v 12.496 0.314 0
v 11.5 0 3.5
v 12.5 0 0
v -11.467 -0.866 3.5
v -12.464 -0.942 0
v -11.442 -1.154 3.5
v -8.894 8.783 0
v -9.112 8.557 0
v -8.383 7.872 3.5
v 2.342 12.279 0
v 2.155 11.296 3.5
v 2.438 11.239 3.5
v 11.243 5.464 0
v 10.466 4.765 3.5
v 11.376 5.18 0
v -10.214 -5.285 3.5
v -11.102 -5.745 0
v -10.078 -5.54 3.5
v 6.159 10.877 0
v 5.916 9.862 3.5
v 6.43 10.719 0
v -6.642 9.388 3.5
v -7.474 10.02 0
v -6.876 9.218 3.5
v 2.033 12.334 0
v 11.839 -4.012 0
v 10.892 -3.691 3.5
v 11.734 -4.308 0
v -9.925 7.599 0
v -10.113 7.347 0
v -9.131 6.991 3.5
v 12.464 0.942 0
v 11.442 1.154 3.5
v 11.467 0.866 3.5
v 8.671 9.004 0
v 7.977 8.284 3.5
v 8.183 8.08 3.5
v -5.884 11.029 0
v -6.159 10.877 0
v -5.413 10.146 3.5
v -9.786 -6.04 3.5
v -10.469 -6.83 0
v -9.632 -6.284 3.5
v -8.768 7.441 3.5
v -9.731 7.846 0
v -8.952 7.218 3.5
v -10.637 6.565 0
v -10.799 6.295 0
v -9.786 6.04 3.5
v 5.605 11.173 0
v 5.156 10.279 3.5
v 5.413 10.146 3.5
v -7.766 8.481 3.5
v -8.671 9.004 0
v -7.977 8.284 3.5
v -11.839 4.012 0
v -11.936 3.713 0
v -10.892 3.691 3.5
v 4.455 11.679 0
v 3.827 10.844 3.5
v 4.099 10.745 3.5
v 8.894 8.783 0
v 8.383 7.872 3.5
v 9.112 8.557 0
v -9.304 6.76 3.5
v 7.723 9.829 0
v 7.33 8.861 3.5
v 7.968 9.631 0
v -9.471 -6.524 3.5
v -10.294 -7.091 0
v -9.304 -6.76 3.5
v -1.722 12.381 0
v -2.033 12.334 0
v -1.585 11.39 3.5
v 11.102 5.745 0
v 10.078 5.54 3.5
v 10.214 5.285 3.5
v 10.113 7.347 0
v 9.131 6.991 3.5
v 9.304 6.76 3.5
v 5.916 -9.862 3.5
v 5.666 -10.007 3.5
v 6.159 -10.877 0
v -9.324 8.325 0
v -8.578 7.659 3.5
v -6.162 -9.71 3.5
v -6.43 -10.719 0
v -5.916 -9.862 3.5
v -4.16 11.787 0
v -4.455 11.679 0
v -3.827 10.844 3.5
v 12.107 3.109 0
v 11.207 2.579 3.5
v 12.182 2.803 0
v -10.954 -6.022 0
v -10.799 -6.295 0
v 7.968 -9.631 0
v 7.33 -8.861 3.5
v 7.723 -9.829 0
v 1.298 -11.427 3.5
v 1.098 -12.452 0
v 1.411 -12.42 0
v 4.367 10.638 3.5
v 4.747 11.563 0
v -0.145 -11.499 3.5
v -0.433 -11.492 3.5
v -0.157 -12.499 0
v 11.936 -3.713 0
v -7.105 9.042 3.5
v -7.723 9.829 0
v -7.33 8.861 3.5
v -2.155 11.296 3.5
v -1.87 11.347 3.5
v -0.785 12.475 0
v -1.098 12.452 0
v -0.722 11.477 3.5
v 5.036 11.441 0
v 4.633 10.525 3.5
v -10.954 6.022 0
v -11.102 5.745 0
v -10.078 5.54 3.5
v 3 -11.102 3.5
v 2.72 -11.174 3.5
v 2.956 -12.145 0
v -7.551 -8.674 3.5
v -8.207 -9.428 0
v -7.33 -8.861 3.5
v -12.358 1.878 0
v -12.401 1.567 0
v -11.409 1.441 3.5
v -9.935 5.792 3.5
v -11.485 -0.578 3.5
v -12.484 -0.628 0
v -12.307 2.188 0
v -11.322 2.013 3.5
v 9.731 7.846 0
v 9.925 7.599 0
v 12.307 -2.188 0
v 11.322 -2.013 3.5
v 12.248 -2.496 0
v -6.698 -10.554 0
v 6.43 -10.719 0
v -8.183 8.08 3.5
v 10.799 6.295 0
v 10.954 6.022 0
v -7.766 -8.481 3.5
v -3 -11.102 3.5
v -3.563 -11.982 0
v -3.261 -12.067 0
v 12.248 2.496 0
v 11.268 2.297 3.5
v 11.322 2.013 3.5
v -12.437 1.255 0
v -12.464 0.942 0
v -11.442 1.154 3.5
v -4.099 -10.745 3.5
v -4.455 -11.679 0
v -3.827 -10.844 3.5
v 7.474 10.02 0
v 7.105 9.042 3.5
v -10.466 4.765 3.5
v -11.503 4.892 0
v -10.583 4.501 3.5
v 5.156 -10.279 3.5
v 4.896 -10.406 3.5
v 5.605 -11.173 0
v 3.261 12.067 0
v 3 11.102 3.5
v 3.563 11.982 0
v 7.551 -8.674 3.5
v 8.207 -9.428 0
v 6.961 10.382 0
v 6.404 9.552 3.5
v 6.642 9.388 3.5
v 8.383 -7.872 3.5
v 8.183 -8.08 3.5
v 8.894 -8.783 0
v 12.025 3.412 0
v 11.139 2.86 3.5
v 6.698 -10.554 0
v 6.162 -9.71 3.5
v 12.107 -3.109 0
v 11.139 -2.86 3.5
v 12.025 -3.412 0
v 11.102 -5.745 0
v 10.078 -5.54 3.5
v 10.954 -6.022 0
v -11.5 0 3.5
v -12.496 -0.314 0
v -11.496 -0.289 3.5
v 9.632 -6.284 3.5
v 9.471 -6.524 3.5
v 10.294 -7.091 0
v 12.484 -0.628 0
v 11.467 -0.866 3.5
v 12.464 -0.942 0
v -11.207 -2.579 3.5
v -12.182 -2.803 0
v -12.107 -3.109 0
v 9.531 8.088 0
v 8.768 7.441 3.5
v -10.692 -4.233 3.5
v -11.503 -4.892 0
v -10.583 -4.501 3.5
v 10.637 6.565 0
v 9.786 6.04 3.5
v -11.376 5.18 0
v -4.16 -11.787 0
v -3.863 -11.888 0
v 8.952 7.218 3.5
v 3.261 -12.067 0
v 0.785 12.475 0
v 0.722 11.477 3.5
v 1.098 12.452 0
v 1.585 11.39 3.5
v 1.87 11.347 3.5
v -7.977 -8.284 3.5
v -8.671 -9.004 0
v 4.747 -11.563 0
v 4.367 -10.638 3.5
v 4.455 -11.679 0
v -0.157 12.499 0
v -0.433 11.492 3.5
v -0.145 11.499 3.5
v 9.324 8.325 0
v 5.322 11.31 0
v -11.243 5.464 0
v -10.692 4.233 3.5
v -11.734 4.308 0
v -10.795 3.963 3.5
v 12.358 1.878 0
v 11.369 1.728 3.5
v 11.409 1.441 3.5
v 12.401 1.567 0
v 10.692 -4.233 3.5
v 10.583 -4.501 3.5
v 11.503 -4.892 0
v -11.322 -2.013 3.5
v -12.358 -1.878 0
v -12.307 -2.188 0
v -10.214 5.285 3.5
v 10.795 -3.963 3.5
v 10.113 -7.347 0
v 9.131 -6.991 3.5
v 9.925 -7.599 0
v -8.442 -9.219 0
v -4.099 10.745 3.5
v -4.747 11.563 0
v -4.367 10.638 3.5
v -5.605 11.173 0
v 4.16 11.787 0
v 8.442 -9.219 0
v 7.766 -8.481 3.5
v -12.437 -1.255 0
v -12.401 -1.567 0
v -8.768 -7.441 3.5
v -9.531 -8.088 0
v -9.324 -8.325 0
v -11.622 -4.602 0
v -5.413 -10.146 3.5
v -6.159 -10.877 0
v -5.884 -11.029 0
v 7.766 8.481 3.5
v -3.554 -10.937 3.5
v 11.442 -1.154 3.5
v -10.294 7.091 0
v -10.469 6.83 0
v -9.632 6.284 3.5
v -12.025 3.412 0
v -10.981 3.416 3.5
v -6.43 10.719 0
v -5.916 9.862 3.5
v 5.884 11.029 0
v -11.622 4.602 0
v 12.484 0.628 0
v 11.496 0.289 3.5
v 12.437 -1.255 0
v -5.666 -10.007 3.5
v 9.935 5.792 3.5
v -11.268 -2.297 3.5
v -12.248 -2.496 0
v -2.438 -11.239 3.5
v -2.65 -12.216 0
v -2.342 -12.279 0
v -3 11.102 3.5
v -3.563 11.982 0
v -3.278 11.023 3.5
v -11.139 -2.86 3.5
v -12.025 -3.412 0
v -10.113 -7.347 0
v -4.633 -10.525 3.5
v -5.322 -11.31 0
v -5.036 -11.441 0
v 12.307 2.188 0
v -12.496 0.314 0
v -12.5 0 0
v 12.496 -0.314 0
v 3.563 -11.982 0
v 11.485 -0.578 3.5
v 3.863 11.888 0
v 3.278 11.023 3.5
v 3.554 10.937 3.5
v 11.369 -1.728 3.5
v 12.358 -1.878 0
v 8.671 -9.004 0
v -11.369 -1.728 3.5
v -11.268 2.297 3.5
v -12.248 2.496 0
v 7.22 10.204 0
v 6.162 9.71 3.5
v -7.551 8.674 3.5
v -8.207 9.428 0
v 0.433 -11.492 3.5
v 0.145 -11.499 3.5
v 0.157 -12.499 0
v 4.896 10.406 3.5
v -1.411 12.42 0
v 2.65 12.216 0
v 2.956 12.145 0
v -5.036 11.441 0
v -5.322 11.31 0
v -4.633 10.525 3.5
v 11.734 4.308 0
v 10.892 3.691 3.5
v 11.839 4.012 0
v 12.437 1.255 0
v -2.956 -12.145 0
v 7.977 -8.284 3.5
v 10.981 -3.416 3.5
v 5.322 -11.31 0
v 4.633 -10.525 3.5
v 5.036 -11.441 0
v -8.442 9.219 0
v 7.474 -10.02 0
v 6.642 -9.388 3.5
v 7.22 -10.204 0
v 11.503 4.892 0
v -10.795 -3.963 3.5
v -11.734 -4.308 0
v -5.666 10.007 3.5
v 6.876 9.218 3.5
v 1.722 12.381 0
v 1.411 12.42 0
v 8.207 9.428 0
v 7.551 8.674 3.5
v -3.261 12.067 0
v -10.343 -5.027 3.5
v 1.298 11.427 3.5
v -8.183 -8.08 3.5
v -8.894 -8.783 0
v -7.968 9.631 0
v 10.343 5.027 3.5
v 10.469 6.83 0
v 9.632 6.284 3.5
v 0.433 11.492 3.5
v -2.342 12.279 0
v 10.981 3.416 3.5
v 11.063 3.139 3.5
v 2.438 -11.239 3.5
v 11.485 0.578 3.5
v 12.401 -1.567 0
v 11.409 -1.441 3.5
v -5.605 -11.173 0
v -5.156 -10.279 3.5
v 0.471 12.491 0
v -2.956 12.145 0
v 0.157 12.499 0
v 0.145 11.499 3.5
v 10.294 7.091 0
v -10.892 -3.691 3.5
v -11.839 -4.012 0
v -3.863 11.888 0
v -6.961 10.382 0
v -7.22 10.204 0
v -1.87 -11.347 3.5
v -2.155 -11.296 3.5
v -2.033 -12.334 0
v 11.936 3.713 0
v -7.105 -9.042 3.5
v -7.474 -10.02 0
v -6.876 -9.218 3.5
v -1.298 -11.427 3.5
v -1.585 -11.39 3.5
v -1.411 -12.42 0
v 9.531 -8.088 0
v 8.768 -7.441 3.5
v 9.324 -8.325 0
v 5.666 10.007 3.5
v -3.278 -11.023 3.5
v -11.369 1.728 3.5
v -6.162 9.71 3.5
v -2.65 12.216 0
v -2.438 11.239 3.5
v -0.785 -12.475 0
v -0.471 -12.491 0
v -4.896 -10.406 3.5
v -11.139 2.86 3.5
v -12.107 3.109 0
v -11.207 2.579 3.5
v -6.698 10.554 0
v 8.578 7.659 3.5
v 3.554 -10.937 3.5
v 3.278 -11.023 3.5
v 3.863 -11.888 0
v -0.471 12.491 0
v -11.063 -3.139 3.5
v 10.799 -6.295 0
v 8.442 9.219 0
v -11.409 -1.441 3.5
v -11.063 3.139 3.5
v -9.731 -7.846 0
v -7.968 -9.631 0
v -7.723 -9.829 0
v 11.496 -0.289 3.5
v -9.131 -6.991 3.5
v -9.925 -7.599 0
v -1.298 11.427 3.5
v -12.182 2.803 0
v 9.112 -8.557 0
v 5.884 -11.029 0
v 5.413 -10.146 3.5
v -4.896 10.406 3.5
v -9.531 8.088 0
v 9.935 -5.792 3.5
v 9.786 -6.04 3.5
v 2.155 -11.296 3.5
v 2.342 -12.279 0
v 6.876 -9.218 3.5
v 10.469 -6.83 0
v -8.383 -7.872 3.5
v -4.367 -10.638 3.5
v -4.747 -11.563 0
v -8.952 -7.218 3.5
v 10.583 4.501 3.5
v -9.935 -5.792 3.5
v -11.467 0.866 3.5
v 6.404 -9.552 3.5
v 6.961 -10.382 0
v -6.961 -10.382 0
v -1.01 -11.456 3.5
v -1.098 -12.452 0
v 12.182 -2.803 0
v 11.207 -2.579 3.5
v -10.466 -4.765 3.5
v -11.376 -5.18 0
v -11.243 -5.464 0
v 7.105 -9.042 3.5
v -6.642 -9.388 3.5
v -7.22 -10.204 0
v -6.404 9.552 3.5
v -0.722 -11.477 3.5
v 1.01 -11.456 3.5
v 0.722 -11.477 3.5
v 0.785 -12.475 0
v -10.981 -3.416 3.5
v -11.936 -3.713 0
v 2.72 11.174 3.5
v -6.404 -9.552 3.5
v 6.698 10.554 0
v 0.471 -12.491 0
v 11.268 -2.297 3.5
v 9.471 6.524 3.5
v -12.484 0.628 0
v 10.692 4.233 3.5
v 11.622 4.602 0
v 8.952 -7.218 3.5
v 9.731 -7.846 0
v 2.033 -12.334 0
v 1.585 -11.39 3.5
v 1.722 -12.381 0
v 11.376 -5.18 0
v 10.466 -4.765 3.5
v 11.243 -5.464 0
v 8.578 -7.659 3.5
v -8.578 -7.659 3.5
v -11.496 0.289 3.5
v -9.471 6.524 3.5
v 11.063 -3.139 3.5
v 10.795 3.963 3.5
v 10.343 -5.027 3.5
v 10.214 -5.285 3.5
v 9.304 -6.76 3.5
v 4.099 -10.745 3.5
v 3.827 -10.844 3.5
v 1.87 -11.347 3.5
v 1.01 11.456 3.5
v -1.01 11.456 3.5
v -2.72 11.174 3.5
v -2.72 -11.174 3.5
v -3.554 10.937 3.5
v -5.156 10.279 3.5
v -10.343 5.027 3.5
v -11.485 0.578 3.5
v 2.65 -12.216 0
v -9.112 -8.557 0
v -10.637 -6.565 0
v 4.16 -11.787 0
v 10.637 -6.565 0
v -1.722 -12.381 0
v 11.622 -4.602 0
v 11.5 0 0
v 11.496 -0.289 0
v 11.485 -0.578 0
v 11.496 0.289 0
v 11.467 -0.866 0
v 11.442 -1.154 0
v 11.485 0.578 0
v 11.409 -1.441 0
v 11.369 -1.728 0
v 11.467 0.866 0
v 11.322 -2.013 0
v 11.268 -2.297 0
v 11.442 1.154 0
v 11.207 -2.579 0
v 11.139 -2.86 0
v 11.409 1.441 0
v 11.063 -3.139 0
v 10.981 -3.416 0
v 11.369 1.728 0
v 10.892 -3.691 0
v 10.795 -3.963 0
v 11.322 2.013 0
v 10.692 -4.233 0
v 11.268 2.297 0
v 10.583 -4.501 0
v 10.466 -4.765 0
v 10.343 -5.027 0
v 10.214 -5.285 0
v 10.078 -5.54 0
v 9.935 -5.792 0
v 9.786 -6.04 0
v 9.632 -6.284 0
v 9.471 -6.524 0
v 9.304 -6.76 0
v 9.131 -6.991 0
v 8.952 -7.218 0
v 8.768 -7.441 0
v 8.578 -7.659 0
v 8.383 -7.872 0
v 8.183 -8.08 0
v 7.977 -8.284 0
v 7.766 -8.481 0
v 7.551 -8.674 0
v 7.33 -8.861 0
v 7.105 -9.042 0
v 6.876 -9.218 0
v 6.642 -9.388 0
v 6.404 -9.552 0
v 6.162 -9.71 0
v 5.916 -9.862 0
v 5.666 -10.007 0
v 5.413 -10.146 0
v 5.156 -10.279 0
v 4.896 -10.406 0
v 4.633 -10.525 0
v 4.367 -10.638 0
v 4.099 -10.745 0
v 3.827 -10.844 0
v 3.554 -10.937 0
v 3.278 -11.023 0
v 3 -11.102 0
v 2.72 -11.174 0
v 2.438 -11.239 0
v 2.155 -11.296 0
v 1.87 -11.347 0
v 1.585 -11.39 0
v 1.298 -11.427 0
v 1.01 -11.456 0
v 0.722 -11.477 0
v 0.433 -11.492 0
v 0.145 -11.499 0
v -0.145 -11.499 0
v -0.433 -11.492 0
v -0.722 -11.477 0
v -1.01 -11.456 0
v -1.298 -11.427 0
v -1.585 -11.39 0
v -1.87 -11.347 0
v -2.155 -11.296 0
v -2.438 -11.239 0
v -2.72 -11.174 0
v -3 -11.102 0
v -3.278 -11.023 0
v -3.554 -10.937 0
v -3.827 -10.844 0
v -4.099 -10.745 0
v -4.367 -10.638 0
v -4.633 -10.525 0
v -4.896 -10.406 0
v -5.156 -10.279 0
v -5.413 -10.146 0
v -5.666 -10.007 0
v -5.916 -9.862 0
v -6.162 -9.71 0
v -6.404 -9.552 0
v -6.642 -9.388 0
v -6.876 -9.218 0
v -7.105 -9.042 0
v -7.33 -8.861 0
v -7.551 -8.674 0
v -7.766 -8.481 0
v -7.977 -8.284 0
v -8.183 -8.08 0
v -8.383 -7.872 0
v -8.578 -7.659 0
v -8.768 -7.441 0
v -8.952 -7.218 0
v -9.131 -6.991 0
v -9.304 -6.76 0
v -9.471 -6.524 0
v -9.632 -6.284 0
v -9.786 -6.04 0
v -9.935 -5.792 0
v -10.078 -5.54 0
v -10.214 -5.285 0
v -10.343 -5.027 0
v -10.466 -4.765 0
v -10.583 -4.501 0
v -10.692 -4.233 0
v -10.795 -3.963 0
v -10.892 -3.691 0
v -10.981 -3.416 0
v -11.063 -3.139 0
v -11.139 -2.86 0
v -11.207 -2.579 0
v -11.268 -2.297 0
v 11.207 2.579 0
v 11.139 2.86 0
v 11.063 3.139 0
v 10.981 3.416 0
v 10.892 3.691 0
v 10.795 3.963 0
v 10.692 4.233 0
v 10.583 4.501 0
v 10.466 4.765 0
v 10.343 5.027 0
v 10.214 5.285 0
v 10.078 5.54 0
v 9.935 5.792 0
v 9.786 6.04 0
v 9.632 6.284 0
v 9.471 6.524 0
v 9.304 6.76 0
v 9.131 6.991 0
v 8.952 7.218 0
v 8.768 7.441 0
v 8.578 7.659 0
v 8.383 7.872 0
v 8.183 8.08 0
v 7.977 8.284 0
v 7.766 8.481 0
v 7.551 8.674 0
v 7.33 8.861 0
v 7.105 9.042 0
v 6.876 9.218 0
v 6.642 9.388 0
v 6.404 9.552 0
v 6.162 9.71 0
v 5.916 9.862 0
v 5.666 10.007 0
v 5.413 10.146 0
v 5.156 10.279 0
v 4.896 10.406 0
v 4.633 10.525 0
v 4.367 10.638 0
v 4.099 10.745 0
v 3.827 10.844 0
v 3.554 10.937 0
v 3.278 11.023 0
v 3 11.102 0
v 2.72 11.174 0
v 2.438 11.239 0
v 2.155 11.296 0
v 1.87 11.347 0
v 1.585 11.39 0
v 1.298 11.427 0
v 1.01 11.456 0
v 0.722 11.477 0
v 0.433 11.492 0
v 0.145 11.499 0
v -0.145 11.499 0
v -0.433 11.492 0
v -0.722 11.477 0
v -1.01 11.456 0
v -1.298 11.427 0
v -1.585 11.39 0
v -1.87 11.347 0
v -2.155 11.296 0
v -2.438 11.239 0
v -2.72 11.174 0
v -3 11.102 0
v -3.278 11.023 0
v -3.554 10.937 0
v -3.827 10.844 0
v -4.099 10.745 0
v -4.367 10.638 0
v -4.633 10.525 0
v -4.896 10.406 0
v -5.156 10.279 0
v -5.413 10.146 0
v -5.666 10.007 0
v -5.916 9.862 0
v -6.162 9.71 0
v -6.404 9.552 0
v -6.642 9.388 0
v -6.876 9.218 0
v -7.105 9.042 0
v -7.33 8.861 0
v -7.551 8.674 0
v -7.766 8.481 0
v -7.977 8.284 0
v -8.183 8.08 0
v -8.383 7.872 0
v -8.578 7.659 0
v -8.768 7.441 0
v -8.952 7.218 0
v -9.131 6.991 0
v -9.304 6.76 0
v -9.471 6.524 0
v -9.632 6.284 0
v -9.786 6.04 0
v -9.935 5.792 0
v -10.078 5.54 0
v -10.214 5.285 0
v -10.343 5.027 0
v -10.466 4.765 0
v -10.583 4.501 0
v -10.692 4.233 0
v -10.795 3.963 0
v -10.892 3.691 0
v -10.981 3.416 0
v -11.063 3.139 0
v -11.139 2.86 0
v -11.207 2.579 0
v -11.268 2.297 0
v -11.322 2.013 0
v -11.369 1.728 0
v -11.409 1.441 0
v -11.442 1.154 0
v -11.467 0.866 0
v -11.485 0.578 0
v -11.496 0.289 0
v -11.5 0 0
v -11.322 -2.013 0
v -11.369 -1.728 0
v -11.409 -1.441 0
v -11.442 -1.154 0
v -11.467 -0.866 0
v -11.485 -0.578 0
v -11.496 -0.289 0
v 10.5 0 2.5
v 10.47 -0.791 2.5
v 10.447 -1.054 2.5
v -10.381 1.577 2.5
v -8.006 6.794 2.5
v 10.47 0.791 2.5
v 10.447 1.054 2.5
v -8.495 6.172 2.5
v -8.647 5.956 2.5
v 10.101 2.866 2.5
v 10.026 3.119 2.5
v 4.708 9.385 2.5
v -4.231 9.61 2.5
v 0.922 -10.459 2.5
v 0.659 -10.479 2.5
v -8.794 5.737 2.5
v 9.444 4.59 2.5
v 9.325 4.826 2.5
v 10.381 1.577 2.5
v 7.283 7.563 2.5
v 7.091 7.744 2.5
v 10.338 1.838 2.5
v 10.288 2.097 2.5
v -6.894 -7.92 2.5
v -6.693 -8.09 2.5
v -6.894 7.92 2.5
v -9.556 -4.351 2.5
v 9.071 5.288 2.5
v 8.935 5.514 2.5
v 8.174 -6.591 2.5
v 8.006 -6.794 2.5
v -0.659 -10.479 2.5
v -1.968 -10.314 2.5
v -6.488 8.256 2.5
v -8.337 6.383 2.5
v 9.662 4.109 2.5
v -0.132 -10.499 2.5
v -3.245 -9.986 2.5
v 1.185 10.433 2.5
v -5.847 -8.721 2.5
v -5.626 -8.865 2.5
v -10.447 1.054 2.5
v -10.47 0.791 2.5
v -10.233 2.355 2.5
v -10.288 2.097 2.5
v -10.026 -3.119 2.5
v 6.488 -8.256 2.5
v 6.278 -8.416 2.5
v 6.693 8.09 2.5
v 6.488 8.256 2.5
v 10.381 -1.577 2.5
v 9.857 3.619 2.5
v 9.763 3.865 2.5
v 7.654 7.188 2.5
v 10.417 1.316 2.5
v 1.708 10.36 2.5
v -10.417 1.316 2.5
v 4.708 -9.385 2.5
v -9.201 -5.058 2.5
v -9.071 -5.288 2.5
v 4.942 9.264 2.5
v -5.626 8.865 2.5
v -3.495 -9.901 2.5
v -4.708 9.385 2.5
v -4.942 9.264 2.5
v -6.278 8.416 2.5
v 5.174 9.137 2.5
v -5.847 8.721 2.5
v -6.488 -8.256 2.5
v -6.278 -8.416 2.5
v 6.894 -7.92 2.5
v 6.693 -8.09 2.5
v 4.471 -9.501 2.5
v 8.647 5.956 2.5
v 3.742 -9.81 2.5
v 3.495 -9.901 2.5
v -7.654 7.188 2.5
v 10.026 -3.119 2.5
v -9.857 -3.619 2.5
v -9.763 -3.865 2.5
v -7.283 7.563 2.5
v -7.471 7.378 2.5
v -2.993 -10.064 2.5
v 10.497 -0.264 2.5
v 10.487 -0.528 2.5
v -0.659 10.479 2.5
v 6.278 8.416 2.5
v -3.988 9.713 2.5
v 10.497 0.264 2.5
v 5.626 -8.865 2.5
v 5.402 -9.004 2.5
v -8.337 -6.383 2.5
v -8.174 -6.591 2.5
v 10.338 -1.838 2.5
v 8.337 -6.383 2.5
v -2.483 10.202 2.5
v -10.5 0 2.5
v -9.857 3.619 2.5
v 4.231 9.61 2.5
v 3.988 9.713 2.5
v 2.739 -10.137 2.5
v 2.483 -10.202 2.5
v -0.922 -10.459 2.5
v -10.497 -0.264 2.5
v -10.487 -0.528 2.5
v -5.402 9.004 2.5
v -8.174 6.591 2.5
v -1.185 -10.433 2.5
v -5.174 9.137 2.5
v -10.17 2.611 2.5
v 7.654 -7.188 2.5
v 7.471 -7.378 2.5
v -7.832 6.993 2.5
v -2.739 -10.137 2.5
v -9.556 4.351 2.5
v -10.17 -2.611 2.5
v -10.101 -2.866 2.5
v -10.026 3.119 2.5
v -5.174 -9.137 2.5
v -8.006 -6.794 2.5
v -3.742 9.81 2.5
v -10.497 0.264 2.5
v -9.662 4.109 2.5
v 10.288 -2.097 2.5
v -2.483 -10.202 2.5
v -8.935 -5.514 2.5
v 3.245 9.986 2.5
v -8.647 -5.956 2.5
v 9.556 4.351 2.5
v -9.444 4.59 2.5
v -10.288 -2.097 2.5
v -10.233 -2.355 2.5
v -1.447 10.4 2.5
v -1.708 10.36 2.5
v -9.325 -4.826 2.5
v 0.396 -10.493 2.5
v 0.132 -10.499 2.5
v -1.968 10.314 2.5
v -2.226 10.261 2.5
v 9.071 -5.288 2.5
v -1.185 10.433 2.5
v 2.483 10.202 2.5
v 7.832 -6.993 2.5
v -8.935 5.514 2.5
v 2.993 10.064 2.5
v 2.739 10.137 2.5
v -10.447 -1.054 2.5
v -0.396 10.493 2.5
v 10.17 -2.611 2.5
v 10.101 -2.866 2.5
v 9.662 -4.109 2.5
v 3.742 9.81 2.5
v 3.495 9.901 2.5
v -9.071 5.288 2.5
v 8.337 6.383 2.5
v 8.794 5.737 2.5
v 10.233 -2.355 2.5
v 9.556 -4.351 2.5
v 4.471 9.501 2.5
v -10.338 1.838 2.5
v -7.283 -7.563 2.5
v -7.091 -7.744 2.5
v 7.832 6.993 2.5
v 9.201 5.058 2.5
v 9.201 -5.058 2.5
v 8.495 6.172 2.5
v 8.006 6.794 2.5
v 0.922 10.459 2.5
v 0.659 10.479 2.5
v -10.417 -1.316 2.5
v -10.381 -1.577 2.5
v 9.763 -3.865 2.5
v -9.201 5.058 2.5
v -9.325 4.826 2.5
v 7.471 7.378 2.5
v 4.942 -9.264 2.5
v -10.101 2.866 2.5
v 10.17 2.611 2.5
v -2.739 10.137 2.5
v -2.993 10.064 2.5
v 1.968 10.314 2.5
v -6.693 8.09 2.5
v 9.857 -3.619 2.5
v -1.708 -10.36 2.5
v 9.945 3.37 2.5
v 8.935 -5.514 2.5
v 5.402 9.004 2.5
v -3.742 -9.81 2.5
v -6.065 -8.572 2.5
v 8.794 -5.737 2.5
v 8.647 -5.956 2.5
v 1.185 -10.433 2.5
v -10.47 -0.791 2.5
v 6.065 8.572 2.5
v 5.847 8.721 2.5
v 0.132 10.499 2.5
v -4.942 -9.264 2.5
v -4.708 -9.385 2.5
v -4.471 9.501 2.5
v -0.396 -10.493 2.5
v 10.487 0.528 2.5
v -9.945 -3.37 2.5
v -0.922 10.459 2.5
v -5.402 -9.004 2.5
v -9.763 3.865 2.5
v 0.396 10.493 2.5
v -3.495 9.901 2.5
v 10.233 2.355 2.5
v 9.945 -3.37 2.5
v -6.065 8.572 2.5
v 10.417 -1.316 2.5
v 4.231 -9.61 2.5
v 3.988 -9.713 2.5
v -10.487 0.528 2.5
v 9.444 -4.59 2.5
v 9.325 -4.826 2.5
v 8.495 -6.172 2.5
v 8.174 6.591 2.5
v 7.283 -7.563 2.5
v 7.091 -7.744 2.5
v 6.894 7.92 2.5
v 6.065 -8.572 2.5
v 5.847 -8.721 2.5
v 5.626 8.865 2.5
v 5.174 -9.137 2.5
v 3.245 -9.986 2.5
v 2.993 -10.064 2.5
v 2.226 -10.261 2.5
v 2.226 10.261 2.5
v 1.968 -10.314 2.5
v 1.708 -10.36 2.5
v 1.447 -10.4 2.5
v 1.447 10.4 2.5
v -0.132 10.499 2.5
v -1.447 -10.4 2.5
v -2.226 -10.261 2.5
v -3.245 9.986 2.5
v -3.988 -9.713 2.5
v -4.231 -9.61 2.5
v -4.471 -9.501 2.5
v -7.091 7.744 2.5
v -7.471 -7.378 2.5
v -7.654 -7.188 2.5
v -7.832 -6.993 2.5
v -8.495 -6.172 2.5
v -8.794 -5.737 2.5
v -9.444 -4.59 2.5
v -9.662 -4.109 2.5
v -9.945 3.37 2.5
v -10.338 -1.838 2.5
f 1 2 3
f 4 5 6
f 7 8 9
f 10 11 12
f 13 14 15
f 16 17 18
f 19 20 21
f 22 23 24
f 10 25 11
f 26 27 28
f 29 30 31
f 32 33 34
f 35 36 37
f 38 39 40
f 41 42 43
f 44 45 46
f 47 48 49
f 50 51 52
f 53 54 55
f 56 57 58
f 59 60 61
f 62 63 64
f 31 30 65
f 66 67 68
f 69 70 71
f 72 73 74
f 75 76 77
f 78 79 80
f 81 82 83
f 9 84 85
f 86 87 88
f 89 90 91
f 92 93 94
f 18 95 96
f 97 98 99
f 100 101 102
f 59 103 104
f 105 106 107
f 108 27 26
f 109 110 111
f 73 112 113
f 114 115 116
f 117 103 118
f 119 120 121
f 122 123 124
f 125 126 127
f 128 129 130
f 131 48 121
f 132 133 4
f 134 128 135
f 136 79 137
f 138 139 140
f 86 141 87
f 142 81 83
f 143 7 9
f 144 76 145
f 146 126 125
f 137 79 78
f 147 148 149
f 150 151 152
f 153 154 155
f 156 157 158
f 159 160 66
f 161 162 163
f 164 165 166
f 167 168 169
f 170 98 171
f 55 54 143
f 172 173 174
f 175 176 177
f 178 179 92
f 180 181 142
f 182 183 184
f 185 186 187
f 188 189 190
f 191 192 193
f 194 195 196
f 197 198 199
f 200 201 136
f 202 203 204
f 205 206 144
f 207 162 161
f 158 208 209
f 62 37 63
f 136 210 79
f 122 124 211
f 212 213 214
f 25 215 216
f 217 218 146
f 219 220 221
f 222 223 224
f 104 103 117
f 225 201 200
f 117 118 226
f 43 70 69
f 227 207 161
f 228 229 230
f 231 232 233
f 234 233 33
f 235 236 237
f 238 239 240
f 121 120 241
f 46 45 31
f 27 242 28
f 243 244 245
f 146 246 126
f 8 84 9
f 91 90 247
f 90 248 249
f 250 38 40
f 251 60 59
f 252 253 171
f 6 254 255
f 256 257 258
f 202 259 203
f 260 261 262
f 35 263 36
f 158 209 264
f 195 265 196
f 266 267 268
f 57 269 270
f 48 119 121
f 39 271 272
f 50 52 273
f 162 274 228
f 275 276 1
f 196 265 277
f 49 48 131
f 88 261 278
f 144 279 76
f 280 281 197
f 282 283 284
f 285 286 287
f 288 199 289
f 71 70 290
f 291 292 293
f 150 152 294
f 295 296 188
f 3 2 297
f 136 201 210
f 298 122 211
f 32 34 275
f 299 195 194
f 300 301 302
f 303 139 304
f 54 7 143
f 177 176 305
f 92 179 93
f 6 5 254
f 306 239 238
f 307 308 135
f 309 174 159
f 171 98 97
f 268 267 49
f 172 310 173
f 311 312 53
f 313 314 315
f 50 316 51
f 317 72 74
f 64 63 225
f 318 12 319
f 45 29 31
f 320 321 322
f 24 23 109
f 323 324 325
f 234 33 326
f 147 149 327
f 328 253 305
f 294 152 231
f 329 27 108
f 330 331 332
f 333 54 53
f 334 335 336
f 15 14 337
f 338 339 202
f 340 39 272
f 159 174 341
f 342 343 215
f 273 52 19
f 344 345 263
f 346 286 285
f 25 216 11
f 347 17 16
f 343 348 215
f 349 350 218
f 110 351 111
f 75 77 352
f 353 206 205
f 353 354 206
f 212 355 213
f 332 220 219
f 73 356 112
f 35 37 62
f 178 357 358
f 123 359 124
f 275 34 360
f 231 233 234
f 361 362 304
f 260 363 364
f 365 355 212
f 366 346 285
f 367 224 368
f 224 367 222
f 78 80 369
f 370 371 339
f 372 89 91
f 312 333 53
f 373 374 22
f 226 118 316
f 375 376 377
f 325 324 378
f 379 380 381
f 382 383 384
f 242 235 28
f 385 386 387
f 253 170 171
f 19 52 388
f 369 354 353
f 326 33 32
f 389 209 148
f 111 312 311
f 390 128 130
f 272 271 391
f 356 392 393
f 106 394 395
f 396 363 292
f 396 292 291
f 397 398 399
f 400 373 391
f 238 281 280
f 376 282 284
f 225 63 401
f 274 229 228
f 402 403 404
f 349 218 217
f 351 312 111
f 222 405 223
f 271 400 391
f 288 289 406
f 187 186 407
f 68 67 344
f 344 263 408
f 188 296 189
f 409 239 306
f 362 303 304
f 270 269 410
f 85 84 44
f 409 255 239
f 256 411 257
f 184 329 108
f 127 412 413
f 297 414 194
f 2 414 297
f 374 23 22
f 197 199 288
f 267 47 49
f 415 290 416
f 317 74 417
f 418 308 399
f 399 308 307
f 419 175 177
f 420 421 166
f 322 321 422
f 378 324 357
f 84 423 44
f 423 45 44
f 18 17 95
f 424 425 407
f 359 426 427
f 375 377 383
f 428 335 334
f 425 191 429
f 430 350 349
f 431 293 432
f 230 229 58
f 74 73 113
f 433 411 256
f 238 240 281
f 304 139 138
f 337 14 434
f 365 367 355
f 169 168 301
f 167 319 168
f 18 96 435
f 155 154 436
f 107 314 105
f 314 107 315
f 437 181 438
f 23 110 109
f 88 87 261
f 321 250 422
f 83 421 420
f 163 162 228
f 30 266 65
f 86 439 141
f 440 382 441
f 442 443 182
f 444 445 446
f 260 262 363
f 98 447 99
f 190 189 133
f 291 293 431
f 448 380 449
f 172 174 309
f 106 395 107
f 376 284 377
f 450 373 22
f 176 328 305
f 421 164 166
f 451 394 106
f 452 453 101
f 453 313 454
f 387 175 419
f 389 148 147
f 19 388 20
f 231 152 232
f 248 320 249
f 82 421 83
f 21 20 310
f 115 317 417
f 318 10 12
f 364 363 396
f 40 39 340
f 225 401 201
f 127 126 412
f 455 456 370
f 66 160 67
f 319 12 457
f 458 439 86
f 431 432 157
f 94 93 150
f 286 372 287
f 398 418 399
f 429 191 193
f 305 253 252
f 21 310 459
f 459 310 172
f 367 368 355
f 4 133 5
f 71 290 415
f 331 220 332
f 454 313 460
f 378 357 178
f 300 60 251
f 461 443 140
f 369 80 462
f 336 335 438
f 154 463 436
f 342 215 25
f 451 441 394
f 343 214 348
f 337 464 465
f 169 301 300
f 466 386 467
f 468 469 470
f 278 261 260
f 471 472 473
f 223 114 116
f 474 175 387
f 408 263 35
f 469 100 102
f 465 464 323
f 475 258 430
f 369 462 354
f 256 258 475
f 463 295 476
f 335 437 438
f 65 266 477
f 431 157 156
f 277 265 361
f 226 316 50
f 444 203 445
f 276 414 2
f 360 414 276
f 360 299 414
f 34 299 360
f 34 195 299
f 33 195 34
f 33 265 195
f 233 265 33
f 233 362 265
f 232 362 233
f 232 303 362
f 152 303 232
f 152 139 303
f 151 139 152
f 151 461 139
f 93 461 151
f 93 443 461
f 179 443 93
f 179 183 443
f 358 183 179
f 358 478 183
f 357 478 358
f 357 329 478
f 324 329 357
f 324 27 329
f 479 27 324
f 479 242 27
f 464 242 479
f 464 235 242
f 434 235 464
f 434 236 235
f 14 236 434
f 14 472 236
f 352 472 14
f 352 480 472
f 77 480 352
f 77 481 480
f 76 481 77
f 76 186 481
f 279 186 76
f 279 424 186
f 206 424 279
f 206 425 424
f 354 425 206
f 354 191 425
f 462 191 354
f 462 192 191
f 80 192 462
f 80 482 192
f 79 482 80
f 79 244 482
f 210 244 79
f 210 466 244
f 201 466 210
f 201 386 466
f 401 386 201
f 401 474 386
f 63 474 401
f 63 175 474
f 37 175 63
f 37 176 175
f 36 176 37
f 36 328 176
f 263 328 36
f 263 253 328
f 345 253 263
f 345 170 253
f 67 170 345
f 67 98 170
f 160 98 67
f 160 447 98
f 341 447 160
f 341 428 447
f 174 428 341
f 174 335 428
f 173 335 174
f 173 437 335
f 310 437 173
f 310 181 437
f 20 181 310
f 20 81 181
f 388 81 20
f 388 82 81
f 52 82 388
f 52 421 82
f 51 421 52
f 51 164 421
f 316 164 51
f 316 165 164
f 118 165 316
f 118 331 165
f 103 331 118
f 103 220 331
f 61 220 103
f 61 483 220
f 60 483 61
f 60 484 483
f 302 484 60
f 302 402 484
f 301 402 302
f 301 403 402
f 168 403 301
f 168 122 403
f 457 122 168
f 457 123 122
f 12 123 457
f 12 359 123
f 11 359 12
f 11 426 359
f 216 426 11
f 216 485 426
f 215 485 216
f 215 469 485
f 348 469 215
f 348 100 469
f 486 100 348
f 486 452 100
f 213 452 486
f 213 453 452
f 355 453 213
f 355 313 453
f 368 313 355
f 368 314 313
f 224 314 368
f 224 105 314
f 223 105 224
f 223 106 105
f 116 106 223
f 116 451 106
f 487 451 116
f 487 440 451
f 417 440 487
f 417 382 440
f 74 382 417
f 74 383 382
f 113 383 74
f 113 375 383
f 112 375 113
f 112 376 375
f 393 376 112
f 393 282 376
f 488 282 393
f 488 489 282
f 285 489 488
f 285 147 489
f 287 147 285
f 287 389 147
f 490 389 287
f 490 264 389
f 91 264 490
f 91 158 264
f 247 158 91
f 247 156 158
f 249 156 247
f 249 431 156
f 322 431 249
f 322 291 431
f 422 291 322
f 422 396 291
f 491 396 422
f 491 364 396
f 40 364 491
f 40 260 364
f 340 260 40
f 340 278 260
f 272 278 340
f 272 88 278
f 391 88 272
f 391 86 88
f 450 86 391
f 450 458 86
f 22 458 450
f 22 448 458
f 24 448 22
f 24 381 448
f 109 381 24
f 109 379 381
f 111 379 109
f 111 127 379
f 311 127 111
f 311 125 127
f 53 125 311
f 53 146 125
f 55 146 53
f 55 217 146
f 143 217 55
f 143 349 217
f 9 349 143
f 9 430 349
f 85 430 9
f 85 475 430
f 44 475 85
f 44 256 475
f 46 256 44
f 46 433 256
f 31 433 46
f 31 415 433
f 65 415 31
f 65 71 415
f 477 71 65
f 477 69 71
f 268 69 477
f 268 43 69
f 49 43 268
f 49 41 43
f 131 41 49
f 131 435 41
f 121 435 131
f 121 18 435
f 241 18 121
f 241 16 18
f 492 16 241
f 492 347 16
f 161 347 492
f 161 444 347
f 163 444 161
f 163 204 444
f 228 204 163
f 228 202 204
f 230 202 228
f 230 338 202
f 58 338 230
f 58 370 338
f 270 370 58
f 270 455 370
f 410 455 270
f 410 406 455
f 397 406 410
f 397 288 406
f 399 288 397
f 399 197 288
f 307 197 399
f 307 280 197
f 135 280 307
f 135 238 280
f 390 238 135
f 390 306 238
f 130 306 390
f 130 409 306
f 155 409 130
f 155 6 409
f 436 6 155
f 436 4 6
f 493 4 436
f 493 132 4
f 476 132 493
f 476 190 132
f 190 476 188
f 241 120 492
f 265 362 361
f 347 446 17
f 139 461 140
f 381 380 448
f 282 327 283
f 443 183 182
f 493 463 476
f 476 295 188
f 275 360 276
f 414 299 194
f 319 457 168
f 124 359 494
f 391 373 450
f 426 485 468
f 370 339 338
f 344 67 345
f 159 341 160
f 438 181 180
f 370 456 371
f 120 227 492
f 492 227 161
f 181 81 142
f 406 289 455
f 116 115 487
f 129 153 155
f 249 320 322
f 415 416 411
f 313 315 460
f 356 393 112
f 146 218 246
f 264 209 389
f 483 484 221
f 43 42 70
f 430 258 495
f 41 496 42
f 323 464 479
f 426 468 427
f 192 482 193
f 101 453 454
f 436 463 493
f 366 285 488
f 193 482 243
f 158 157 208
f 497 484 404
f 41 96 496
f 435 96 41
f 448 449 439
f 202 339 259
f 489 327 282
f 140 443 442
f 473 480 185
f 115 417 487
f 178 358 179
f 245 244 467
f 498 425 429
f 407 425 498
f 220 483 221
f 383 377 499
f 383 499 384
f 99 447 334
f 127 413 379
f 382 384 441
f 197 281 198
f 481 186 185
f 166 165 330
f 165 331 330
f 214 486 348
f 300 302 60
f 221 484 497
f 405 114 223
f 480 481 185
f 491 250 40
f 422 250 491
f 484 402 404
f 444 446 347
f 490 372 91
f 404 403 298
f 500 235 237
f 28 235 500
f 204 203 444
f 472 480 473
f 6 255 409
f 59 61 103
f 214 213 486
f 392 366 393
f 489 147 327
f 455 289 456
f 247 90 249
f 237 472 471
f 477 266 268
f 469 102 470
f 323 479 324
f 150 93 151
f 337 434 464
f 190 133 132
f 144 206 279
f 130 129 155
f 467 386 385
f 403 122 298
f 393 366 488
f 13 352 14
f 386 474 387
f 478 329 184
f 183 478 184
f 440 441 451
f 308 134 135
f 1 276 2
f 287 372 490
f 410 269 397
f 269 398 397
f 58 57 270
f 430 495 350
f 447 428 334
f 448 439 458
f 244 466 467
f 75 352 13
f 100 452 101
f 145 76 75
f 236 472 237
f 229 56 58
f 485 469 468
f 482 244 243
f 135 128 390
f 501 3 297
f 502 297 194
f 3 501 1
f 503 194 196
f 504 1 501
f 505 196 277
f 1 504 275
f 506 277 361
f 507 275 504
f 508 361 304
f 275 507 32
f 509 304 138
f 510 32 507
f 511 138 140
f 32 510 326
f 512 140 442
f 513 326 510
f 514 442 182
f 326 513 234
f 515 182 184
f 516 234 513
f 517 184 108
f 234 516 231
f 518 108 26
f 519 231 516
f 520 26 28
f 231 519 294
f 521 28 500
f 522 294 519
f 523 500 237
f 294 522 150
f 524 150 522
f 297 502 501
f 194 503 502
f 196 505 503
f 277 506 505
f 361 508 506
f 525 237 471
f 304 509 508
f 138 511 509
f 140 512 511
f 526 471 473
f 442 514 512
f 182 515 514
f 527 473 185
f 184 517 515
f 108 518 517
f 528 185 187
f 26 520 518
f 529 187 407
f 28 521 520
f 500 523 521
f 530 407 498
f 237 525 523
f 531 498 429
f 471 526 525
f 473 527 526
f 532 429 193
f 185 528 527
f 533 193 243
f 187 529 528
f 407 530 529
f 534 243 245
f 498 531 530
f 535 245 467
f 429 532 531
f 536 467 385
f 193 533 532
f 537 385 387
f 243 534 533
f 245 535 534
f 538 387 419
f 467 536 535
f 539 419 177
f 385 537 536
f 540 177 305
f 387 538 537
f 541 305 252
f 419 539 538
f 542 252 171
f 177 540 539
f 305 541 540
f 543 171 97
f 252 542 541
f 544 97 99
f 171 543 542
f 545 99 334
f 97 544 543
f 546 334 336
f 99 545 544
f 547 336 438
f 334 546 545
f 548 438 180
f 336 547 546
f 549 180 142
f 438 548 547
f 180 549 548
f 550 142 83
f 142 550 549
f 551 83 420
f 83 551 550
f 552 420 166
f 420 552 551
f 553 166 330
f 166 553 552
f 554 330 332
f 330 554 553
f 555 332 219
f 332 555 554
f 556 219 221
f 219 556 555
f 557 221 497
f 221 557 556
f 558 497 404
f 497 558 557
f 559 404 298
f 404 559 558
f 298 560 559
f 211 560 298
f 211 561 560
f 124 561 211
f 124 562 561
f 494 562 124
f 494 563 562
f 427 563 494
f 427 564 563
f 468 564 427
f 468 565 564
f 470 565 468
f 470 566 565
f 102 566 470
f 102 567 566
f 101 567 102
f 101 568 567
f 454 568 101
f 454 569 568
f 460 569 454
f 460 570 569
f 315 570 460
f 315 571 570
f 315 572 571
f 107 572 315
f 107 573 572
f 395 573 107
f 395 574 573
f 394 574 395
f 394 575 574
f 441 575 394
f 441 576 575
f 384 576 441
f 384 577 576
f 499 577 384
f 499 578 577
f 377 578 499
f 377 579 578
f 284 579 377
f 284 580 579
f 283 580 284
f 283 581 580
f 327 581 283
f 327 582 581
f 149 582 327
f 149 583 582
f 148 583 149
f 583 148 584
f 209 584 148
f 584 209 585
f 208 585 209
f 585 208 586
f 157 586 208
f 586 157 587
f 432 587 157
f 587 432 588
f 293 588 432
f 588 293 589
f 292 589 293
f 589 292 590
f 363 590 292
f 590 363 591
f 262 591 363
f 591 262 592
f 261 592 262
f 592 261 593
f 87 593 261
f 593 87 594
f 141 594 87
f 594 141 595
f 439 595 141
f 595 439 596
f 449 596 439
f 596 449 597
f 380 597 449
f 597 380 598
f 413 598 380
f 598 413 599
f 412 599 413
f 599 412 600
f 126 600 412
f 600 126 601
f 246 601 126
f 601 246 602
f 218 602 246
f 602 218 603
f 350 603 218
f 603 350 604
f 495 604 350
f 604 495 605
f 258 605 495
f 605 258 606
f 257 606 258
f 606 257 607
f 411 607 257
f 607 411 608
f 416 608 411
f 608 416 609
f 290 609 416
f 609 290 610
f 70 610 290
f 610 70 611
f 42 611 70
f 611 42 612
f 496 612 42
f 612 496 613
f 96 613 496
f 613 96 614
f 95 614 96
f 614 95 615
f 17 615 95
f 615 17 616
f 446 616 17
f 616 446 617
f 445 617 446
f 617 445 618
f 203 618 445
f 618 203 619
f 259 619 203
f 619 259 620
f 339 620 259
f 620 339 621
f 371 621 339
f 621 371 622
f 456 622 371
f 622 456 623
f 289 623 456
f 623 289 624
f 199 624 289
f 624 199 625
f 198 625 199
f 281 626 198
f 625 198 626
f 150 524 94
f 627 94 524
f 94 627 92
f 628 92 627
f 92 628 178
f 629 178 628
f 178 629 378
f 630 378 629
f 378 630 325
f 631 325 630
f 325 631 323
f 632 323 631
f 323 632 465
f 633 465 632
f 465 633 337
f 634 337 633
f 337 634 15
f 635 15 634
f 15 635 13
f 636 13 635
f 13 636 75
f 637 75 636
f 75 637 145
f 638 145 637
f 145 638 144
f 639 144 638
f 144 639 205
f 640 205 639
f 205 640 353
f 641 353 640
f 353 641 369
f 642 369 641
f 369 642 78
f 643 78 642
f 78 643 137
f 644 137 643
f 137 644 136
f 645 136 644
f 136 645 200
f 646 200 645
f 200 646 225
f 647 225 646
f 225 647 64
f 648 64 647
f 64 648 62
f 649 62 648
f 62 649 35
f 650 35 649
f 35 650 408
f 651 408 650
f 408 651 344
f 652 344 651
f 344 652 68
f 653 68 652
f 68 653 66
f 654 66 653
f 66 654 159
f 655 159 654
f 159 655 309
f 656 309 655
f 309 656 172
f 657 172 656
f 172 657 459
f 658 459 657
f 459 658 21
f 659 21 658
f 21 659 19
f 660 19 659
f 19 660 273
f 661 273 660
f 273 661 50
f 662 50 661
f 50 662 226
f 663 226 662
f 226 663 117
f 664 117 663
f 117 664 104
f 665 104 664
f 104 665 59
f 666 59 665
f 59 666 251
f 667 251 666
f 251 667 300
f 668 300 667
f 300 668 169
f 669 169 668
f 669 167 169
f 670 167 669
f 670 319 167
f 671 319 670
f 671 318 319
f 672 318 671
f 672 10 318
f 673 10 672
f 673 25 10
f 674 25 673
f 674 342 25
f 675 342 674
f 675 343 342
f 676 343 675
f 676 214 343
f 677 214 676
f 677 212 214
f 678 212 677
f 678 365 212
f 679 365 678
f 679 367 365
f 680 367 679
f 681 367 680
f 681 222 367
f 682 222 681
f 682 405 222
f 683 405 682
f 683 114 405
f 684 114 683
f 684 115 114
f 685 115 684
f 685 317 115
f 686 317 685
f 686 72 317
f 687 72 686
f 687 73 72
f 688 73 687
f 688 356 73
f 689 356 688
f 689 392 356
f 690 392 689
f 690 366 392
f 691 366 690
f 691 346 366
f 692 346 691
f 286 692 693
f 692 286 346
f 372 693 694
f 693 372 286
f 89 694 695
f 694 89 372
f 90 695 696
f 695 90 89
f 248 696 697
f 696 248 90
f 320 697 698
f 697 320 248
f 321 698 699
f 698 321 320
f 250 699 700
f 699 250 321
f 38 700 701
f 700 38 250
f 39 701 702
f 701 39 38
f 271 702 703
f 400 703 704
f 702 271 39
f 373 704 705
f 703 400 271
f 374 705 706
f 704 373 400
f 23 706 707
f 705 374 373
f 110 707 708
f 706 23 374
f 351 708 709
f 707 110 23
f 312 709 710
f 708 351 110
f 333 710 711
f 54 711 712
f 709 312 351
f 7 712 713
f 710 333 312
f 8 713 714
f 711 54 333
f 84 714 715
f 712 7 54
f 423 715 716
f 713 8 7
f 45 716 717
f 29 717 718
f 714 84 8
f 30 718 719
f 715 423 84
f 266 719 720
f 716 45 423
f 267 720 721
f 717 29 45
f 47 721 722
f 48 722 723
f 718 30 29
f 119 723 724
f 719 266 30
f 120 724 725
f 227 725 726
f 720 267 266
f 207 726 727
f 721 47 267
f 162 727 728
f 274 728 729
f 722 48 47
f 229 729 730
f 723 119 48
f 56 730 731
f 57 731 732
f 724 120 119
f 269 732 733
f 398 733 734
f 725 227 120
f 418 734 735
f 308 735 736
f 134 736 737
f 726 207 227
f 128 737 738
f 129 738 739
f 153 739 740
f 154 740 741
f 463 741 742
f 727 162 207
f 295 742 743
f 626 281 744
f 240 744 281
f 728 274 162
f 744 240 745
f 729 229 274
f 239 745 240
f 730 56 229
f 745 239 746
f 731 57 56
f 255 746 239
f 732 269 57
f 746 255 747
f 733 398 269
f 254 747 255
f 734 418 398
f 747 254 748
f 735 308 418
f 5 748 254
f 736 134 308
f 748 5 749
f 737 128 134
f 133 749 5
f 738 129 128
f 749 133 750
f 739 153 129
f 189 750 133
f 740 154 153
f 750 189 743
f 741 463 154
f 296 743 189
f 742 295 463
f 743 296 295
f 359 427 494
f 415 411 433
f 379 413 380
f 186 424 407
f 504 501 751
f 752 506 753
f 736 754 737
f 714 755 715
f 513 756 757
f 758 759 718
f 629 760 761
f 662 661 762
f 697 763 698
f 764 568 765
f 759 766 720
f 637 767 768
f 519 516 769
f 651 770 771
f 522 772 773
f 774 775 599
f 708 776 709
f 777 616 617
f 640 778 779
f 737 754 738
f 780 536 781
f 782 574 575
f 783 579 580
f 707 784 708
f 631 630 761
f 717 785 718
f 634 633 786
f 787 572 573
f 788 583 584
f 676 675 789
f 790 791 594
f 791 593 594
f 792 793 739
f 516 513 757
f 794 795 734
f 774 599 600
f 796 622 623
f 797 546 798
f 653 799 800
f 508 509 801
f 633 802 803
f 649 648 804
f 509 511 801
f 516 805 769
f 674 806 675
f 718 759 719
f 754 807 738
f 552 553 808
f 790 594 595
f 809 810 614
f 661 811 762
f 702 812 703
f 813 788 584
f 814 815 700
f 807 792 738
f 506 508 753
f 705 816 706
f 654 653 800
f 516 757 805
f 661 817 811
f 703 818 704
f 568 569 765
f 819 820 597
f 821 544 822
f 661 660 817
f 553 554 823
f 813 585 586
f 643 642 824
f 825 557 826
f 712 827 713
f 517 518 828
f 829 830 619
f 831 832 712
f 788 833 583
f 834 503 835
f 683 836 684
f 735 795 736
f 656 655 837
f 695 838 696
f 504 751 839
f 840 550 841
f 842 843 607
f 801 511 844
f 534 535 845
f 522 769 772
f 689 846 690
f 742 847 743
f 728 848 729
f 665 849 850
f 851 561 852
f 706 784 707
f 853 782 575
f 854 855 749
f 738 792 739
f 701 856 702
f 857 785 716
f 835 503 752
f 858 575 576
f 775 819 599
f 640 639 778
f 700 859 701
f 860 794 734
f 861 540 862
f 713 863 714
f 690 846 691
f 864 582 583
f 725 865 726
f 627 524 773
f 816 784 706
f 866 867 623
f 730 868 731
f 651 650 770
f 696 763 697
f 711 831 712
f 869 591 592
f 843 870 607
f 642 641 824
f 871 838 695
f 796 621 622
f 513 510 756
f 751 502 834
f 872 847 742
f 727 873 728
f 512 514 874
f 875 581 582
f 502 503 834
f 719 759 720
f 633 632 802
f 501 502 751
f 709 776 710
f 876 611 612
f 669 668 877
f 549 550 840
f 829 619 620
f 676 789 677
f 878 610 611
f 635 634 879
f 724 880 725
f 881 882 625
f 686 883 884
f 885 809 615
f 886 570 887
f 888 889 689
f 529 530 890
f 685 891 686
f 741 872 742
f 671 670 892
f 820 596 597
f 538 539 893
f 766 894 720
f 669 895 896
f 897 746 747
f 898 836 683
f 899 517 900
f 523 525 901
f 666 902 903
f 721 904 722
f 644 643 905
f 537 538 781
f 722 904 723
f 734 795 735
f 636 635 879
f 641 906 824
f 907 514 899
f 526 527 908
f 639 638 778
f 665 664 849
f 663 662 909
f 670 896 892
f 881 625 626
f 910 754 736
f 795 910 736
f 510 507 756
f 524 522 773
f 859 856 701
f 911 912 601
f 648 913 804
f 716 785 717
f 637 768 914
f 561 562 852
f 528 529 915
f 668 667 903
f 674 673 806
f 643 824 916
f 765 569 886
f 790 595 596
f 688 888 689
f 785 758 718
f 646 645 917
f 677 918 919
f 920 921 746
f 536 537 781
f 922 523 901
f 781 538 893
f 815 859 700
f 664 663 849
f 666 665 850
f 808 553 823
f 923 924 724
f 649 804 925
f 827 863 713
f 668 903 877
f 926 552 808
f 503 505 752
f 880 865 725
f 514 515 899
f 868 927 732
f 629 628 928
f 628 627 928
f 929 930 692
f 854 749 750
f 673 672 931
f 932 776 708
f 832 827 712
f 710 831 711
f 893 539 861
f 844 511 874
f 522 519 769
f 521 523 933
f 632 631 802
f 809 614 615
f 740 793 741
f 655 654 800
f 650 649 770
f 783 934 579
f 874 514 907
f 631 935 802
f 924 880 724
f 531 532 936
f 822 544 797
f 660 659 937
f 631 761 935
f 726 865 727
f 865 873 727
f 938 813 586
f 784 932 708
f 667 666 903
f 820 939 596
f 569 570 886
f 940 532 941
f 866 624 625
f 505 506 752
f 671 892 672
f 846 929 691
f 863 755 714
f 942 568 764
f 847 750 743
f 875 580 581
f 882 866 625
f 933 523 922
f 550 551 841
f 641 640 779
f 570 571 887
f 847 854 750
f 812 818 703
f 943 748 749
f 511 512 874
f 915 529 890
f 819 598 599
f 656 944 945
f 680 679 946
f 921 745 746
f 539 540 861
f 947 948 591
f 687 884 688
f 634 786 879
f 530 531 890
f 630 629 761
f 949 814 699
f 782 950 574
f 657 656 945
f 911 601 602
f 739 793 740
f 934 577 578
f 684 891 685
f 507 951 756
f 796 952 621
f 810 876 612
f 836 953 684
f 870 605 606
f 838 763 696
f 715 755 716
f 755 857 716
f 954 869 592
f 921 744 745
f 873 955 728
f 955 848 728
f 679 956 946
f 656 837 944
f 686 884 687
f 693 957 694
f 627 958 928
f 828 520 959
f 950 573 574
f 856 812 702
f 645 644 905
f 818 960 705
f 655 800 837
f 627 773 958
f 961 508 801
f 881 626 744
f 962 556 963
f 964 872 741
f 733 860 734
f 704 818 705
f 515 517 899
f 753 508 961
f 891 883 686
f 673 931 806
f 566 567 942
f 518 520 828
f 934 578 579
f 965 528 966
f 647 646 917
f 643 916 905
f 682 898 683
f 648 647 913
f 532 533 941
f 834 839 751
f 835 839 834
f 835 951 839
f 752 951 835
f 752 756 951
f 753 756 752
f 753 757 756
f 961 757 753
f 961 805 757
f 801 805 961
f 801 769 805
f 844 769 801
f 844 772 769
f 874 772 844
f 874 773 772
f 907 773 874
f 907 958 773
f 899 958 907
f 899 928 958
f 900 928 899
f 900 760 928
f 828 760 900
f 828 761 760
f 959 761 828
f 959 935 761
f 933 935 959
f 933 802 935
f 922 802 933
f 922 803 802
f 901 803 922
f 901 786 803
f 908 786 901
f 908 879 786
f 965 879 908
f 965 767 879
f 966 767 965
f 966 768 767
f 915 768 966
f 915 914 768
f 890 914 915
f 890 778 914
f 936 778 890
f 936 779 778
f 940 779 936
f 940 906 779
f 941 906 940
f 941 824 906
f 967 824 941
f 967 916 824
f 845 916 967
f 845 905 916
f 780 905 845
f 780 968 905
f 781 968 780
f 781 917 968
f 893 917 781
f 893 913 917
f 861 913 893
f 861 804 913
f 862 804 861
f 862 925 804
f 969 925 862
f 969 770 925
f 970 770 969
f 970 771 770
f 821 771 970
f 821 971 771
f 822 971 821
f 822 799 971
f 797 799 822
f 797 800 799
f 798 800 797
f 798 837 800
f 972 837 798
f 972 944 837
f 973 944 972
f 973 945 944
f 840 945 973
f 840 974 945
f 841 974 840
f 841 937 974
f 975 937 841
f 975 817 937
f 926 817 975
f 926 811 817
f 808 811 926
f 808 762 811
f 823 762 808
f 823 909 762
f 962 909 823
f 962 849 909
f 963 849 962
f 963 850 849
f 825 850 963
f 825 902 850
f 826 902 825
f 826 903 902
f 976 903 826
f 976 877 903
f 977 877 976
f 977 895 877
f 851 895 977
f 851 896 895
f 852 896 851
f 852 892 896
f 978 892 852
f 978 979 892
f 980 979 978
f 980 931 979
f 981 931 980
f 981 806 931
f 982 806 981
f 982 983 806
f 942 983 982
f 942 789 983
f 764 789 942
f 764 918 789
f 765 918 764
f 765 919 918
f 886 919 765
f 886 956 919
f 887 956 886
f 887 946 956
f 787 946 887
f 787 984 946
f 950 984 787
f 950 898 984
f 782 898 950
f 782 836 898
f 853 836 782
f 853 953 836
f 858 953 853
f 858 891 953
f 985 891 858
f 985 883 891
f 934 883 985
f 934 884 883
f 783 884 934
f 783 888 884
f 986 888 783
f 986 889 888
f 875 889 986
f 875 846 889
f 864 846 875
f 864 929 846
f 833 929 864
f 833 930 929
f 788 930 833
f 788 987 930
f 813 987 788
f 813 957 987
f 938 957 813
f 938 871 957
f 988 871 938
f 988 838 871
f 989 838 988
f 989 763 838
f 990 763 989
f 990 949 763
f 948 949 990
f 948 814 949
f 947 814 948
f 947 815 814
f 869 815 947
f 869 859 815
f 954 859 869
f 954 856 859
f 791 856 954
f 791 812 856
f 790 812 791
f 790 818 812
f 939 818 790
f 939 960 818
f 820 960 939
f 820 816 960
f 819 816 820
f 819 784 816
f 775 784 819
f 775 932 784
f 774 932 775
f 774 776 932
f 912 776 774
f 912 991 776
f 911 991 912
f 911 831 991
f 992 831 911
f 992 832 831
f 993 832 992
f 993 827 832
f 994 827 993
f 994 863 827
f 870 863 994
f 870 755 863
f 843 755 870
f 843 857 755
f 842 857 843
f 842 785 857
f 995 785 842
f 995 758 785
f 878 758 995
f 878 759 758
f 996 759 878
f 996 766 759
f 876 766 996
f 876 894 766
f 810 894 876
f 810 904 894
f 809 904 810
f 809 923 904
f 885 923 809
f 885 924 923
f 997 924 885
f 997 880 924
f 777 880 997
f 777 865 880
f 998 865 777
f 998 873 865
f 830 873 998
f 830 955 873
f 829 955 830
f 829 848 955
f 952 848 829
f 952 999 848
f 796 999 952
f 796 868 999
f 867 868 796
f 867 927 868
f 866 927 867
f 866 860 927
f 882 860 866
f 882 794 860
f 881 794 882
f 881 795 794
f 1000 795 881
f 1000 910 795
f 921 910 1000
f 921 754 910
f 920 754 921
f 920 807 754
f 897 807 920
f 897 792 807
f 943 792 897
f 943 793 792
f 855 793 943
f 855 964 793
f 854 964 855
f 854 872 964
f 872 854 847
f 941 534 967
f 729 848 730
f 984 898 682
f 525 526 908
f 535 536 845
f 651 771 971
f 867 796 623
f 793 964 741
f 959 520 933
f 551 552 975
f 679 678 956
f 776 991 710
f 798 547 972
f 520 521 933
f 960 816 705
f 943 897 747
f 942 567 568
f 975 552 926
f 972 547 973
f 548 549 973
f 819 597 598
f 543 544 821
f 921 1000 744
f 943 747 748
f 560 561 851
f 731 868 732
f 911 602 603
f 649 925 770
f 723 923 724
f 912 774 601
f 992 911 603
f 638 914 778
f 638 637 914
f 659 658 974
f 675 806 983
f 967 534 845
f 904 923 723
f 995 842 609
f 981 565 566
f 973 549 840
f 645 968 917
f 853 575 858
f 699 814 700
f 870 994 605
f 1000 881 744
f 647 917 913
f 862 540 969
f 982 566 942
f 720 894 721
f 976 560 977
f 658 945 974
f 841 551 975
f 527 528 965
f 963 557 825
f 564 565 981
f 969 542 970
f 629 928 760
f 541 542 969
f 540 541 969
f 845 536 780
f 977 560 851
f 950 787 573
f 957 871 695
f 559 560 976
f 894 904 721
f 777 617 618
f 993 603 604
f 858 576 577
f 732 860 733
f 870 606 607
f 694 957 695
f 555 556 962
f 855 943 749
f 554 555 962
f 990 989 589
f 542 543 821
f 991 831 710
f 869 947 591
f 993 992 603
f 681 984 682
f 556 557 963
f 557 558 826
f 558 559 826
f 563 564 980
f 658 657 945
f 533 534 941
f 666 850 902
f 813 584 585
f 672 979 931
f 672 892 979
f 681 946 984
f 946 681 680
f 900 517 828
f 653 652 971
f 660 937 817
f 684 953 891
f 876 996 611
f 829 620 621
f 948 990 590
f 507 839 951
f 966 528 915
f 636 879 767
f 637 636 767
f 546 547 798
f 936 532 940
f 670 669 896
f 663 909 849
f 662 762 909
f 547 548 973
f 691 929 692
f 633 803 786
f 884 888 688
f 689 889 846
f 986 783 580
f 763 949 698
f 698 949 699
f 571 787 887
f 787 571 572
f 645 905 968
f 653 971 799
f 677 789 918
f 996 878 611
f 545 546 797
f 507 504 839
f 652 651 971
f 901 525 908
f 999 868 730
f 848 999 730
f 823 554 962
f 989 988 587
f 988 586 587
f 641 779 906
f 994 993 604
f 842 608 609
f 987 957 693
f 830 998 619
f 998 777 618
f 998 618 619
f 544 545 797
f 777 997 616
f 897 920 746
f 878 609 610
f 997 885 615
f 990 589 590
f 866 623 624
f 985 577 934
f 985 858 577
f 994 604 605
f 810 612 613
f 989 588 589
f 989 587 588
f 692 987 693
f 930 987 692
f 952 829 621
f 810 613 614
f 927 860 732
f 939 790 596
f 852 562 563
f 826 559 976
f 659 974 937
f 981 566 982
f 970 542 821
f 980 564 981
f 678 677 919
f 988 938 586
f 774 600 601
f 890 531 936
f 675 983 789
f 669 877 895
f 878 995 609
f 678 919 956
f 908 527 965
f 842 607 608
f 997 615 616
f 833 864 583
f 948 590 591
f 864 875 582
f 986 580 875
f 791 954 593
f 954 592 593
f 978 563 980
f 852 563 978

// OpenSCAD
bottom = 25;
top = 23;
height = 3.5;
depth = 2.5;
thickness = 1;

difference() {
    cylinder(h = height, d1=bottom, d2=top, $fn=250);
    cylinder(h = depth, d1=bottom-(2*thickness), d2=top-(2*thickness), $fn=250);
}
